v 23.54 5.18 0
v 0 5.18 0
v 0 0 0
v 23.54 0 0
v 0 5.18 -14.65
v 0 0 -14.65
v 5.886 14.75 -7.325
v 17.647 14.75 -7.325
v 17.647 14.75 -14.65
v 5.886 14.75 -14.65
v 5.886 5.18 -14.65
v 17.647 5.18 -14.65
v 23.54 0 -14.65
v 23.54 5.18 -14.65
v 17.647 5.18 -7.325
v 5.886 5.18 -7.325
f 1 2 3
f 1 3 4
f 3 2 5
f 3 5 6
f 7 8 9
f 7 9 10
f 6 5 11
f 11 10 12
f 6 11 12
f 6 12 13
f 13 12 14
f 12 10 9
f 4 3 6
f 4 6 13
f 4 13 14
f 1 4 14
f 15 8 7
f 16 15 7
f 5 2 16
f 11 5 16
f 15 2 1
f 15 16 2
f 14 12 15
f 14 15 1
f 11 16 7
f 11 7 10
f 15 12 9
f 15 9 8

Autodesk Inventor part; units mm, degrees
ref_plane "YZ Plane" through (0, 0, 0) normal (1, 0, 0) x (0, 1, 0)
ref_plane "XZ Plane" through (0, 0, 0) normal (0, 1, 0) x (-1, 0, 0)
ref_plane "XY Plane" through (0, 0, 0) normal (0, 0, 1) x (1, 0, 0)
sketch "Sketch1" plane through (0, 0, 0) normal (0, 0, 1) x (1, 0, 0)
  line L0 (0, 0) -> (23.54, 0)
  line L1 (23.54, 0) -> (23.54, 14.75)
  line L2 (23.54, 14.75) -> (0, 14.75)
  line L3 (0, 14.75) -> (0, 0)
  dimension "d0" = 23.54
  dimension "d1" = 14.75
extrude "Extrusion1" add sketch "Sketch1" against normal blind 14.65
sketch "Sketch2" plane through (0, 14.75, 0) normal (0, 1, 0) x (1, 0, 0)
  line L0 (23.54, 0) -> (0, 0) projected
  line L1 (0, 0) -> (0, 14.65) projected
  line L2 (23.54, 14.65) -> (0, 14.65) projected
  line L3 (0, 0) -> (5.8865, 0)
  line L4 (5.8865, 0) -> (5.8865, 14.65)
  line L5 (5.8865, 14.65) -> (0, 14.65)
  line L6 (0, 14.65) -> (0, 0)
  line L7 (23.54, 14.65) -> (17.6472, 14.65)
  line L8 (17.6472, 14.65) -> (17.6472, 0)
  line L9 (17.6472, 0) -> (23.54, 0)
  line L10 (23.54, 0) -> (23.54, 14.65)
  line L11 (5.8865, 0) -> (17.6472, 0)
  line L12 (17.6472, 0) -> (17.6472, 7.325)
  line L13 (17.6472, 7.325) -> (5.8865, 7.325)
  line L14 (5.8865, 7.325) -> (5.8865, 0)
  dimension "d4" = 5.8864
  dimension "d5" = 5.8928
extrude "Extrusion2" cut sketch "Sketch2" against normal blind 9.57 contours L0 L8 L2 L10 | L0 L4 L13 L8 | L0 L1 L2 L4
properties part number "BOB-10031 USB Micro B Breakout"
